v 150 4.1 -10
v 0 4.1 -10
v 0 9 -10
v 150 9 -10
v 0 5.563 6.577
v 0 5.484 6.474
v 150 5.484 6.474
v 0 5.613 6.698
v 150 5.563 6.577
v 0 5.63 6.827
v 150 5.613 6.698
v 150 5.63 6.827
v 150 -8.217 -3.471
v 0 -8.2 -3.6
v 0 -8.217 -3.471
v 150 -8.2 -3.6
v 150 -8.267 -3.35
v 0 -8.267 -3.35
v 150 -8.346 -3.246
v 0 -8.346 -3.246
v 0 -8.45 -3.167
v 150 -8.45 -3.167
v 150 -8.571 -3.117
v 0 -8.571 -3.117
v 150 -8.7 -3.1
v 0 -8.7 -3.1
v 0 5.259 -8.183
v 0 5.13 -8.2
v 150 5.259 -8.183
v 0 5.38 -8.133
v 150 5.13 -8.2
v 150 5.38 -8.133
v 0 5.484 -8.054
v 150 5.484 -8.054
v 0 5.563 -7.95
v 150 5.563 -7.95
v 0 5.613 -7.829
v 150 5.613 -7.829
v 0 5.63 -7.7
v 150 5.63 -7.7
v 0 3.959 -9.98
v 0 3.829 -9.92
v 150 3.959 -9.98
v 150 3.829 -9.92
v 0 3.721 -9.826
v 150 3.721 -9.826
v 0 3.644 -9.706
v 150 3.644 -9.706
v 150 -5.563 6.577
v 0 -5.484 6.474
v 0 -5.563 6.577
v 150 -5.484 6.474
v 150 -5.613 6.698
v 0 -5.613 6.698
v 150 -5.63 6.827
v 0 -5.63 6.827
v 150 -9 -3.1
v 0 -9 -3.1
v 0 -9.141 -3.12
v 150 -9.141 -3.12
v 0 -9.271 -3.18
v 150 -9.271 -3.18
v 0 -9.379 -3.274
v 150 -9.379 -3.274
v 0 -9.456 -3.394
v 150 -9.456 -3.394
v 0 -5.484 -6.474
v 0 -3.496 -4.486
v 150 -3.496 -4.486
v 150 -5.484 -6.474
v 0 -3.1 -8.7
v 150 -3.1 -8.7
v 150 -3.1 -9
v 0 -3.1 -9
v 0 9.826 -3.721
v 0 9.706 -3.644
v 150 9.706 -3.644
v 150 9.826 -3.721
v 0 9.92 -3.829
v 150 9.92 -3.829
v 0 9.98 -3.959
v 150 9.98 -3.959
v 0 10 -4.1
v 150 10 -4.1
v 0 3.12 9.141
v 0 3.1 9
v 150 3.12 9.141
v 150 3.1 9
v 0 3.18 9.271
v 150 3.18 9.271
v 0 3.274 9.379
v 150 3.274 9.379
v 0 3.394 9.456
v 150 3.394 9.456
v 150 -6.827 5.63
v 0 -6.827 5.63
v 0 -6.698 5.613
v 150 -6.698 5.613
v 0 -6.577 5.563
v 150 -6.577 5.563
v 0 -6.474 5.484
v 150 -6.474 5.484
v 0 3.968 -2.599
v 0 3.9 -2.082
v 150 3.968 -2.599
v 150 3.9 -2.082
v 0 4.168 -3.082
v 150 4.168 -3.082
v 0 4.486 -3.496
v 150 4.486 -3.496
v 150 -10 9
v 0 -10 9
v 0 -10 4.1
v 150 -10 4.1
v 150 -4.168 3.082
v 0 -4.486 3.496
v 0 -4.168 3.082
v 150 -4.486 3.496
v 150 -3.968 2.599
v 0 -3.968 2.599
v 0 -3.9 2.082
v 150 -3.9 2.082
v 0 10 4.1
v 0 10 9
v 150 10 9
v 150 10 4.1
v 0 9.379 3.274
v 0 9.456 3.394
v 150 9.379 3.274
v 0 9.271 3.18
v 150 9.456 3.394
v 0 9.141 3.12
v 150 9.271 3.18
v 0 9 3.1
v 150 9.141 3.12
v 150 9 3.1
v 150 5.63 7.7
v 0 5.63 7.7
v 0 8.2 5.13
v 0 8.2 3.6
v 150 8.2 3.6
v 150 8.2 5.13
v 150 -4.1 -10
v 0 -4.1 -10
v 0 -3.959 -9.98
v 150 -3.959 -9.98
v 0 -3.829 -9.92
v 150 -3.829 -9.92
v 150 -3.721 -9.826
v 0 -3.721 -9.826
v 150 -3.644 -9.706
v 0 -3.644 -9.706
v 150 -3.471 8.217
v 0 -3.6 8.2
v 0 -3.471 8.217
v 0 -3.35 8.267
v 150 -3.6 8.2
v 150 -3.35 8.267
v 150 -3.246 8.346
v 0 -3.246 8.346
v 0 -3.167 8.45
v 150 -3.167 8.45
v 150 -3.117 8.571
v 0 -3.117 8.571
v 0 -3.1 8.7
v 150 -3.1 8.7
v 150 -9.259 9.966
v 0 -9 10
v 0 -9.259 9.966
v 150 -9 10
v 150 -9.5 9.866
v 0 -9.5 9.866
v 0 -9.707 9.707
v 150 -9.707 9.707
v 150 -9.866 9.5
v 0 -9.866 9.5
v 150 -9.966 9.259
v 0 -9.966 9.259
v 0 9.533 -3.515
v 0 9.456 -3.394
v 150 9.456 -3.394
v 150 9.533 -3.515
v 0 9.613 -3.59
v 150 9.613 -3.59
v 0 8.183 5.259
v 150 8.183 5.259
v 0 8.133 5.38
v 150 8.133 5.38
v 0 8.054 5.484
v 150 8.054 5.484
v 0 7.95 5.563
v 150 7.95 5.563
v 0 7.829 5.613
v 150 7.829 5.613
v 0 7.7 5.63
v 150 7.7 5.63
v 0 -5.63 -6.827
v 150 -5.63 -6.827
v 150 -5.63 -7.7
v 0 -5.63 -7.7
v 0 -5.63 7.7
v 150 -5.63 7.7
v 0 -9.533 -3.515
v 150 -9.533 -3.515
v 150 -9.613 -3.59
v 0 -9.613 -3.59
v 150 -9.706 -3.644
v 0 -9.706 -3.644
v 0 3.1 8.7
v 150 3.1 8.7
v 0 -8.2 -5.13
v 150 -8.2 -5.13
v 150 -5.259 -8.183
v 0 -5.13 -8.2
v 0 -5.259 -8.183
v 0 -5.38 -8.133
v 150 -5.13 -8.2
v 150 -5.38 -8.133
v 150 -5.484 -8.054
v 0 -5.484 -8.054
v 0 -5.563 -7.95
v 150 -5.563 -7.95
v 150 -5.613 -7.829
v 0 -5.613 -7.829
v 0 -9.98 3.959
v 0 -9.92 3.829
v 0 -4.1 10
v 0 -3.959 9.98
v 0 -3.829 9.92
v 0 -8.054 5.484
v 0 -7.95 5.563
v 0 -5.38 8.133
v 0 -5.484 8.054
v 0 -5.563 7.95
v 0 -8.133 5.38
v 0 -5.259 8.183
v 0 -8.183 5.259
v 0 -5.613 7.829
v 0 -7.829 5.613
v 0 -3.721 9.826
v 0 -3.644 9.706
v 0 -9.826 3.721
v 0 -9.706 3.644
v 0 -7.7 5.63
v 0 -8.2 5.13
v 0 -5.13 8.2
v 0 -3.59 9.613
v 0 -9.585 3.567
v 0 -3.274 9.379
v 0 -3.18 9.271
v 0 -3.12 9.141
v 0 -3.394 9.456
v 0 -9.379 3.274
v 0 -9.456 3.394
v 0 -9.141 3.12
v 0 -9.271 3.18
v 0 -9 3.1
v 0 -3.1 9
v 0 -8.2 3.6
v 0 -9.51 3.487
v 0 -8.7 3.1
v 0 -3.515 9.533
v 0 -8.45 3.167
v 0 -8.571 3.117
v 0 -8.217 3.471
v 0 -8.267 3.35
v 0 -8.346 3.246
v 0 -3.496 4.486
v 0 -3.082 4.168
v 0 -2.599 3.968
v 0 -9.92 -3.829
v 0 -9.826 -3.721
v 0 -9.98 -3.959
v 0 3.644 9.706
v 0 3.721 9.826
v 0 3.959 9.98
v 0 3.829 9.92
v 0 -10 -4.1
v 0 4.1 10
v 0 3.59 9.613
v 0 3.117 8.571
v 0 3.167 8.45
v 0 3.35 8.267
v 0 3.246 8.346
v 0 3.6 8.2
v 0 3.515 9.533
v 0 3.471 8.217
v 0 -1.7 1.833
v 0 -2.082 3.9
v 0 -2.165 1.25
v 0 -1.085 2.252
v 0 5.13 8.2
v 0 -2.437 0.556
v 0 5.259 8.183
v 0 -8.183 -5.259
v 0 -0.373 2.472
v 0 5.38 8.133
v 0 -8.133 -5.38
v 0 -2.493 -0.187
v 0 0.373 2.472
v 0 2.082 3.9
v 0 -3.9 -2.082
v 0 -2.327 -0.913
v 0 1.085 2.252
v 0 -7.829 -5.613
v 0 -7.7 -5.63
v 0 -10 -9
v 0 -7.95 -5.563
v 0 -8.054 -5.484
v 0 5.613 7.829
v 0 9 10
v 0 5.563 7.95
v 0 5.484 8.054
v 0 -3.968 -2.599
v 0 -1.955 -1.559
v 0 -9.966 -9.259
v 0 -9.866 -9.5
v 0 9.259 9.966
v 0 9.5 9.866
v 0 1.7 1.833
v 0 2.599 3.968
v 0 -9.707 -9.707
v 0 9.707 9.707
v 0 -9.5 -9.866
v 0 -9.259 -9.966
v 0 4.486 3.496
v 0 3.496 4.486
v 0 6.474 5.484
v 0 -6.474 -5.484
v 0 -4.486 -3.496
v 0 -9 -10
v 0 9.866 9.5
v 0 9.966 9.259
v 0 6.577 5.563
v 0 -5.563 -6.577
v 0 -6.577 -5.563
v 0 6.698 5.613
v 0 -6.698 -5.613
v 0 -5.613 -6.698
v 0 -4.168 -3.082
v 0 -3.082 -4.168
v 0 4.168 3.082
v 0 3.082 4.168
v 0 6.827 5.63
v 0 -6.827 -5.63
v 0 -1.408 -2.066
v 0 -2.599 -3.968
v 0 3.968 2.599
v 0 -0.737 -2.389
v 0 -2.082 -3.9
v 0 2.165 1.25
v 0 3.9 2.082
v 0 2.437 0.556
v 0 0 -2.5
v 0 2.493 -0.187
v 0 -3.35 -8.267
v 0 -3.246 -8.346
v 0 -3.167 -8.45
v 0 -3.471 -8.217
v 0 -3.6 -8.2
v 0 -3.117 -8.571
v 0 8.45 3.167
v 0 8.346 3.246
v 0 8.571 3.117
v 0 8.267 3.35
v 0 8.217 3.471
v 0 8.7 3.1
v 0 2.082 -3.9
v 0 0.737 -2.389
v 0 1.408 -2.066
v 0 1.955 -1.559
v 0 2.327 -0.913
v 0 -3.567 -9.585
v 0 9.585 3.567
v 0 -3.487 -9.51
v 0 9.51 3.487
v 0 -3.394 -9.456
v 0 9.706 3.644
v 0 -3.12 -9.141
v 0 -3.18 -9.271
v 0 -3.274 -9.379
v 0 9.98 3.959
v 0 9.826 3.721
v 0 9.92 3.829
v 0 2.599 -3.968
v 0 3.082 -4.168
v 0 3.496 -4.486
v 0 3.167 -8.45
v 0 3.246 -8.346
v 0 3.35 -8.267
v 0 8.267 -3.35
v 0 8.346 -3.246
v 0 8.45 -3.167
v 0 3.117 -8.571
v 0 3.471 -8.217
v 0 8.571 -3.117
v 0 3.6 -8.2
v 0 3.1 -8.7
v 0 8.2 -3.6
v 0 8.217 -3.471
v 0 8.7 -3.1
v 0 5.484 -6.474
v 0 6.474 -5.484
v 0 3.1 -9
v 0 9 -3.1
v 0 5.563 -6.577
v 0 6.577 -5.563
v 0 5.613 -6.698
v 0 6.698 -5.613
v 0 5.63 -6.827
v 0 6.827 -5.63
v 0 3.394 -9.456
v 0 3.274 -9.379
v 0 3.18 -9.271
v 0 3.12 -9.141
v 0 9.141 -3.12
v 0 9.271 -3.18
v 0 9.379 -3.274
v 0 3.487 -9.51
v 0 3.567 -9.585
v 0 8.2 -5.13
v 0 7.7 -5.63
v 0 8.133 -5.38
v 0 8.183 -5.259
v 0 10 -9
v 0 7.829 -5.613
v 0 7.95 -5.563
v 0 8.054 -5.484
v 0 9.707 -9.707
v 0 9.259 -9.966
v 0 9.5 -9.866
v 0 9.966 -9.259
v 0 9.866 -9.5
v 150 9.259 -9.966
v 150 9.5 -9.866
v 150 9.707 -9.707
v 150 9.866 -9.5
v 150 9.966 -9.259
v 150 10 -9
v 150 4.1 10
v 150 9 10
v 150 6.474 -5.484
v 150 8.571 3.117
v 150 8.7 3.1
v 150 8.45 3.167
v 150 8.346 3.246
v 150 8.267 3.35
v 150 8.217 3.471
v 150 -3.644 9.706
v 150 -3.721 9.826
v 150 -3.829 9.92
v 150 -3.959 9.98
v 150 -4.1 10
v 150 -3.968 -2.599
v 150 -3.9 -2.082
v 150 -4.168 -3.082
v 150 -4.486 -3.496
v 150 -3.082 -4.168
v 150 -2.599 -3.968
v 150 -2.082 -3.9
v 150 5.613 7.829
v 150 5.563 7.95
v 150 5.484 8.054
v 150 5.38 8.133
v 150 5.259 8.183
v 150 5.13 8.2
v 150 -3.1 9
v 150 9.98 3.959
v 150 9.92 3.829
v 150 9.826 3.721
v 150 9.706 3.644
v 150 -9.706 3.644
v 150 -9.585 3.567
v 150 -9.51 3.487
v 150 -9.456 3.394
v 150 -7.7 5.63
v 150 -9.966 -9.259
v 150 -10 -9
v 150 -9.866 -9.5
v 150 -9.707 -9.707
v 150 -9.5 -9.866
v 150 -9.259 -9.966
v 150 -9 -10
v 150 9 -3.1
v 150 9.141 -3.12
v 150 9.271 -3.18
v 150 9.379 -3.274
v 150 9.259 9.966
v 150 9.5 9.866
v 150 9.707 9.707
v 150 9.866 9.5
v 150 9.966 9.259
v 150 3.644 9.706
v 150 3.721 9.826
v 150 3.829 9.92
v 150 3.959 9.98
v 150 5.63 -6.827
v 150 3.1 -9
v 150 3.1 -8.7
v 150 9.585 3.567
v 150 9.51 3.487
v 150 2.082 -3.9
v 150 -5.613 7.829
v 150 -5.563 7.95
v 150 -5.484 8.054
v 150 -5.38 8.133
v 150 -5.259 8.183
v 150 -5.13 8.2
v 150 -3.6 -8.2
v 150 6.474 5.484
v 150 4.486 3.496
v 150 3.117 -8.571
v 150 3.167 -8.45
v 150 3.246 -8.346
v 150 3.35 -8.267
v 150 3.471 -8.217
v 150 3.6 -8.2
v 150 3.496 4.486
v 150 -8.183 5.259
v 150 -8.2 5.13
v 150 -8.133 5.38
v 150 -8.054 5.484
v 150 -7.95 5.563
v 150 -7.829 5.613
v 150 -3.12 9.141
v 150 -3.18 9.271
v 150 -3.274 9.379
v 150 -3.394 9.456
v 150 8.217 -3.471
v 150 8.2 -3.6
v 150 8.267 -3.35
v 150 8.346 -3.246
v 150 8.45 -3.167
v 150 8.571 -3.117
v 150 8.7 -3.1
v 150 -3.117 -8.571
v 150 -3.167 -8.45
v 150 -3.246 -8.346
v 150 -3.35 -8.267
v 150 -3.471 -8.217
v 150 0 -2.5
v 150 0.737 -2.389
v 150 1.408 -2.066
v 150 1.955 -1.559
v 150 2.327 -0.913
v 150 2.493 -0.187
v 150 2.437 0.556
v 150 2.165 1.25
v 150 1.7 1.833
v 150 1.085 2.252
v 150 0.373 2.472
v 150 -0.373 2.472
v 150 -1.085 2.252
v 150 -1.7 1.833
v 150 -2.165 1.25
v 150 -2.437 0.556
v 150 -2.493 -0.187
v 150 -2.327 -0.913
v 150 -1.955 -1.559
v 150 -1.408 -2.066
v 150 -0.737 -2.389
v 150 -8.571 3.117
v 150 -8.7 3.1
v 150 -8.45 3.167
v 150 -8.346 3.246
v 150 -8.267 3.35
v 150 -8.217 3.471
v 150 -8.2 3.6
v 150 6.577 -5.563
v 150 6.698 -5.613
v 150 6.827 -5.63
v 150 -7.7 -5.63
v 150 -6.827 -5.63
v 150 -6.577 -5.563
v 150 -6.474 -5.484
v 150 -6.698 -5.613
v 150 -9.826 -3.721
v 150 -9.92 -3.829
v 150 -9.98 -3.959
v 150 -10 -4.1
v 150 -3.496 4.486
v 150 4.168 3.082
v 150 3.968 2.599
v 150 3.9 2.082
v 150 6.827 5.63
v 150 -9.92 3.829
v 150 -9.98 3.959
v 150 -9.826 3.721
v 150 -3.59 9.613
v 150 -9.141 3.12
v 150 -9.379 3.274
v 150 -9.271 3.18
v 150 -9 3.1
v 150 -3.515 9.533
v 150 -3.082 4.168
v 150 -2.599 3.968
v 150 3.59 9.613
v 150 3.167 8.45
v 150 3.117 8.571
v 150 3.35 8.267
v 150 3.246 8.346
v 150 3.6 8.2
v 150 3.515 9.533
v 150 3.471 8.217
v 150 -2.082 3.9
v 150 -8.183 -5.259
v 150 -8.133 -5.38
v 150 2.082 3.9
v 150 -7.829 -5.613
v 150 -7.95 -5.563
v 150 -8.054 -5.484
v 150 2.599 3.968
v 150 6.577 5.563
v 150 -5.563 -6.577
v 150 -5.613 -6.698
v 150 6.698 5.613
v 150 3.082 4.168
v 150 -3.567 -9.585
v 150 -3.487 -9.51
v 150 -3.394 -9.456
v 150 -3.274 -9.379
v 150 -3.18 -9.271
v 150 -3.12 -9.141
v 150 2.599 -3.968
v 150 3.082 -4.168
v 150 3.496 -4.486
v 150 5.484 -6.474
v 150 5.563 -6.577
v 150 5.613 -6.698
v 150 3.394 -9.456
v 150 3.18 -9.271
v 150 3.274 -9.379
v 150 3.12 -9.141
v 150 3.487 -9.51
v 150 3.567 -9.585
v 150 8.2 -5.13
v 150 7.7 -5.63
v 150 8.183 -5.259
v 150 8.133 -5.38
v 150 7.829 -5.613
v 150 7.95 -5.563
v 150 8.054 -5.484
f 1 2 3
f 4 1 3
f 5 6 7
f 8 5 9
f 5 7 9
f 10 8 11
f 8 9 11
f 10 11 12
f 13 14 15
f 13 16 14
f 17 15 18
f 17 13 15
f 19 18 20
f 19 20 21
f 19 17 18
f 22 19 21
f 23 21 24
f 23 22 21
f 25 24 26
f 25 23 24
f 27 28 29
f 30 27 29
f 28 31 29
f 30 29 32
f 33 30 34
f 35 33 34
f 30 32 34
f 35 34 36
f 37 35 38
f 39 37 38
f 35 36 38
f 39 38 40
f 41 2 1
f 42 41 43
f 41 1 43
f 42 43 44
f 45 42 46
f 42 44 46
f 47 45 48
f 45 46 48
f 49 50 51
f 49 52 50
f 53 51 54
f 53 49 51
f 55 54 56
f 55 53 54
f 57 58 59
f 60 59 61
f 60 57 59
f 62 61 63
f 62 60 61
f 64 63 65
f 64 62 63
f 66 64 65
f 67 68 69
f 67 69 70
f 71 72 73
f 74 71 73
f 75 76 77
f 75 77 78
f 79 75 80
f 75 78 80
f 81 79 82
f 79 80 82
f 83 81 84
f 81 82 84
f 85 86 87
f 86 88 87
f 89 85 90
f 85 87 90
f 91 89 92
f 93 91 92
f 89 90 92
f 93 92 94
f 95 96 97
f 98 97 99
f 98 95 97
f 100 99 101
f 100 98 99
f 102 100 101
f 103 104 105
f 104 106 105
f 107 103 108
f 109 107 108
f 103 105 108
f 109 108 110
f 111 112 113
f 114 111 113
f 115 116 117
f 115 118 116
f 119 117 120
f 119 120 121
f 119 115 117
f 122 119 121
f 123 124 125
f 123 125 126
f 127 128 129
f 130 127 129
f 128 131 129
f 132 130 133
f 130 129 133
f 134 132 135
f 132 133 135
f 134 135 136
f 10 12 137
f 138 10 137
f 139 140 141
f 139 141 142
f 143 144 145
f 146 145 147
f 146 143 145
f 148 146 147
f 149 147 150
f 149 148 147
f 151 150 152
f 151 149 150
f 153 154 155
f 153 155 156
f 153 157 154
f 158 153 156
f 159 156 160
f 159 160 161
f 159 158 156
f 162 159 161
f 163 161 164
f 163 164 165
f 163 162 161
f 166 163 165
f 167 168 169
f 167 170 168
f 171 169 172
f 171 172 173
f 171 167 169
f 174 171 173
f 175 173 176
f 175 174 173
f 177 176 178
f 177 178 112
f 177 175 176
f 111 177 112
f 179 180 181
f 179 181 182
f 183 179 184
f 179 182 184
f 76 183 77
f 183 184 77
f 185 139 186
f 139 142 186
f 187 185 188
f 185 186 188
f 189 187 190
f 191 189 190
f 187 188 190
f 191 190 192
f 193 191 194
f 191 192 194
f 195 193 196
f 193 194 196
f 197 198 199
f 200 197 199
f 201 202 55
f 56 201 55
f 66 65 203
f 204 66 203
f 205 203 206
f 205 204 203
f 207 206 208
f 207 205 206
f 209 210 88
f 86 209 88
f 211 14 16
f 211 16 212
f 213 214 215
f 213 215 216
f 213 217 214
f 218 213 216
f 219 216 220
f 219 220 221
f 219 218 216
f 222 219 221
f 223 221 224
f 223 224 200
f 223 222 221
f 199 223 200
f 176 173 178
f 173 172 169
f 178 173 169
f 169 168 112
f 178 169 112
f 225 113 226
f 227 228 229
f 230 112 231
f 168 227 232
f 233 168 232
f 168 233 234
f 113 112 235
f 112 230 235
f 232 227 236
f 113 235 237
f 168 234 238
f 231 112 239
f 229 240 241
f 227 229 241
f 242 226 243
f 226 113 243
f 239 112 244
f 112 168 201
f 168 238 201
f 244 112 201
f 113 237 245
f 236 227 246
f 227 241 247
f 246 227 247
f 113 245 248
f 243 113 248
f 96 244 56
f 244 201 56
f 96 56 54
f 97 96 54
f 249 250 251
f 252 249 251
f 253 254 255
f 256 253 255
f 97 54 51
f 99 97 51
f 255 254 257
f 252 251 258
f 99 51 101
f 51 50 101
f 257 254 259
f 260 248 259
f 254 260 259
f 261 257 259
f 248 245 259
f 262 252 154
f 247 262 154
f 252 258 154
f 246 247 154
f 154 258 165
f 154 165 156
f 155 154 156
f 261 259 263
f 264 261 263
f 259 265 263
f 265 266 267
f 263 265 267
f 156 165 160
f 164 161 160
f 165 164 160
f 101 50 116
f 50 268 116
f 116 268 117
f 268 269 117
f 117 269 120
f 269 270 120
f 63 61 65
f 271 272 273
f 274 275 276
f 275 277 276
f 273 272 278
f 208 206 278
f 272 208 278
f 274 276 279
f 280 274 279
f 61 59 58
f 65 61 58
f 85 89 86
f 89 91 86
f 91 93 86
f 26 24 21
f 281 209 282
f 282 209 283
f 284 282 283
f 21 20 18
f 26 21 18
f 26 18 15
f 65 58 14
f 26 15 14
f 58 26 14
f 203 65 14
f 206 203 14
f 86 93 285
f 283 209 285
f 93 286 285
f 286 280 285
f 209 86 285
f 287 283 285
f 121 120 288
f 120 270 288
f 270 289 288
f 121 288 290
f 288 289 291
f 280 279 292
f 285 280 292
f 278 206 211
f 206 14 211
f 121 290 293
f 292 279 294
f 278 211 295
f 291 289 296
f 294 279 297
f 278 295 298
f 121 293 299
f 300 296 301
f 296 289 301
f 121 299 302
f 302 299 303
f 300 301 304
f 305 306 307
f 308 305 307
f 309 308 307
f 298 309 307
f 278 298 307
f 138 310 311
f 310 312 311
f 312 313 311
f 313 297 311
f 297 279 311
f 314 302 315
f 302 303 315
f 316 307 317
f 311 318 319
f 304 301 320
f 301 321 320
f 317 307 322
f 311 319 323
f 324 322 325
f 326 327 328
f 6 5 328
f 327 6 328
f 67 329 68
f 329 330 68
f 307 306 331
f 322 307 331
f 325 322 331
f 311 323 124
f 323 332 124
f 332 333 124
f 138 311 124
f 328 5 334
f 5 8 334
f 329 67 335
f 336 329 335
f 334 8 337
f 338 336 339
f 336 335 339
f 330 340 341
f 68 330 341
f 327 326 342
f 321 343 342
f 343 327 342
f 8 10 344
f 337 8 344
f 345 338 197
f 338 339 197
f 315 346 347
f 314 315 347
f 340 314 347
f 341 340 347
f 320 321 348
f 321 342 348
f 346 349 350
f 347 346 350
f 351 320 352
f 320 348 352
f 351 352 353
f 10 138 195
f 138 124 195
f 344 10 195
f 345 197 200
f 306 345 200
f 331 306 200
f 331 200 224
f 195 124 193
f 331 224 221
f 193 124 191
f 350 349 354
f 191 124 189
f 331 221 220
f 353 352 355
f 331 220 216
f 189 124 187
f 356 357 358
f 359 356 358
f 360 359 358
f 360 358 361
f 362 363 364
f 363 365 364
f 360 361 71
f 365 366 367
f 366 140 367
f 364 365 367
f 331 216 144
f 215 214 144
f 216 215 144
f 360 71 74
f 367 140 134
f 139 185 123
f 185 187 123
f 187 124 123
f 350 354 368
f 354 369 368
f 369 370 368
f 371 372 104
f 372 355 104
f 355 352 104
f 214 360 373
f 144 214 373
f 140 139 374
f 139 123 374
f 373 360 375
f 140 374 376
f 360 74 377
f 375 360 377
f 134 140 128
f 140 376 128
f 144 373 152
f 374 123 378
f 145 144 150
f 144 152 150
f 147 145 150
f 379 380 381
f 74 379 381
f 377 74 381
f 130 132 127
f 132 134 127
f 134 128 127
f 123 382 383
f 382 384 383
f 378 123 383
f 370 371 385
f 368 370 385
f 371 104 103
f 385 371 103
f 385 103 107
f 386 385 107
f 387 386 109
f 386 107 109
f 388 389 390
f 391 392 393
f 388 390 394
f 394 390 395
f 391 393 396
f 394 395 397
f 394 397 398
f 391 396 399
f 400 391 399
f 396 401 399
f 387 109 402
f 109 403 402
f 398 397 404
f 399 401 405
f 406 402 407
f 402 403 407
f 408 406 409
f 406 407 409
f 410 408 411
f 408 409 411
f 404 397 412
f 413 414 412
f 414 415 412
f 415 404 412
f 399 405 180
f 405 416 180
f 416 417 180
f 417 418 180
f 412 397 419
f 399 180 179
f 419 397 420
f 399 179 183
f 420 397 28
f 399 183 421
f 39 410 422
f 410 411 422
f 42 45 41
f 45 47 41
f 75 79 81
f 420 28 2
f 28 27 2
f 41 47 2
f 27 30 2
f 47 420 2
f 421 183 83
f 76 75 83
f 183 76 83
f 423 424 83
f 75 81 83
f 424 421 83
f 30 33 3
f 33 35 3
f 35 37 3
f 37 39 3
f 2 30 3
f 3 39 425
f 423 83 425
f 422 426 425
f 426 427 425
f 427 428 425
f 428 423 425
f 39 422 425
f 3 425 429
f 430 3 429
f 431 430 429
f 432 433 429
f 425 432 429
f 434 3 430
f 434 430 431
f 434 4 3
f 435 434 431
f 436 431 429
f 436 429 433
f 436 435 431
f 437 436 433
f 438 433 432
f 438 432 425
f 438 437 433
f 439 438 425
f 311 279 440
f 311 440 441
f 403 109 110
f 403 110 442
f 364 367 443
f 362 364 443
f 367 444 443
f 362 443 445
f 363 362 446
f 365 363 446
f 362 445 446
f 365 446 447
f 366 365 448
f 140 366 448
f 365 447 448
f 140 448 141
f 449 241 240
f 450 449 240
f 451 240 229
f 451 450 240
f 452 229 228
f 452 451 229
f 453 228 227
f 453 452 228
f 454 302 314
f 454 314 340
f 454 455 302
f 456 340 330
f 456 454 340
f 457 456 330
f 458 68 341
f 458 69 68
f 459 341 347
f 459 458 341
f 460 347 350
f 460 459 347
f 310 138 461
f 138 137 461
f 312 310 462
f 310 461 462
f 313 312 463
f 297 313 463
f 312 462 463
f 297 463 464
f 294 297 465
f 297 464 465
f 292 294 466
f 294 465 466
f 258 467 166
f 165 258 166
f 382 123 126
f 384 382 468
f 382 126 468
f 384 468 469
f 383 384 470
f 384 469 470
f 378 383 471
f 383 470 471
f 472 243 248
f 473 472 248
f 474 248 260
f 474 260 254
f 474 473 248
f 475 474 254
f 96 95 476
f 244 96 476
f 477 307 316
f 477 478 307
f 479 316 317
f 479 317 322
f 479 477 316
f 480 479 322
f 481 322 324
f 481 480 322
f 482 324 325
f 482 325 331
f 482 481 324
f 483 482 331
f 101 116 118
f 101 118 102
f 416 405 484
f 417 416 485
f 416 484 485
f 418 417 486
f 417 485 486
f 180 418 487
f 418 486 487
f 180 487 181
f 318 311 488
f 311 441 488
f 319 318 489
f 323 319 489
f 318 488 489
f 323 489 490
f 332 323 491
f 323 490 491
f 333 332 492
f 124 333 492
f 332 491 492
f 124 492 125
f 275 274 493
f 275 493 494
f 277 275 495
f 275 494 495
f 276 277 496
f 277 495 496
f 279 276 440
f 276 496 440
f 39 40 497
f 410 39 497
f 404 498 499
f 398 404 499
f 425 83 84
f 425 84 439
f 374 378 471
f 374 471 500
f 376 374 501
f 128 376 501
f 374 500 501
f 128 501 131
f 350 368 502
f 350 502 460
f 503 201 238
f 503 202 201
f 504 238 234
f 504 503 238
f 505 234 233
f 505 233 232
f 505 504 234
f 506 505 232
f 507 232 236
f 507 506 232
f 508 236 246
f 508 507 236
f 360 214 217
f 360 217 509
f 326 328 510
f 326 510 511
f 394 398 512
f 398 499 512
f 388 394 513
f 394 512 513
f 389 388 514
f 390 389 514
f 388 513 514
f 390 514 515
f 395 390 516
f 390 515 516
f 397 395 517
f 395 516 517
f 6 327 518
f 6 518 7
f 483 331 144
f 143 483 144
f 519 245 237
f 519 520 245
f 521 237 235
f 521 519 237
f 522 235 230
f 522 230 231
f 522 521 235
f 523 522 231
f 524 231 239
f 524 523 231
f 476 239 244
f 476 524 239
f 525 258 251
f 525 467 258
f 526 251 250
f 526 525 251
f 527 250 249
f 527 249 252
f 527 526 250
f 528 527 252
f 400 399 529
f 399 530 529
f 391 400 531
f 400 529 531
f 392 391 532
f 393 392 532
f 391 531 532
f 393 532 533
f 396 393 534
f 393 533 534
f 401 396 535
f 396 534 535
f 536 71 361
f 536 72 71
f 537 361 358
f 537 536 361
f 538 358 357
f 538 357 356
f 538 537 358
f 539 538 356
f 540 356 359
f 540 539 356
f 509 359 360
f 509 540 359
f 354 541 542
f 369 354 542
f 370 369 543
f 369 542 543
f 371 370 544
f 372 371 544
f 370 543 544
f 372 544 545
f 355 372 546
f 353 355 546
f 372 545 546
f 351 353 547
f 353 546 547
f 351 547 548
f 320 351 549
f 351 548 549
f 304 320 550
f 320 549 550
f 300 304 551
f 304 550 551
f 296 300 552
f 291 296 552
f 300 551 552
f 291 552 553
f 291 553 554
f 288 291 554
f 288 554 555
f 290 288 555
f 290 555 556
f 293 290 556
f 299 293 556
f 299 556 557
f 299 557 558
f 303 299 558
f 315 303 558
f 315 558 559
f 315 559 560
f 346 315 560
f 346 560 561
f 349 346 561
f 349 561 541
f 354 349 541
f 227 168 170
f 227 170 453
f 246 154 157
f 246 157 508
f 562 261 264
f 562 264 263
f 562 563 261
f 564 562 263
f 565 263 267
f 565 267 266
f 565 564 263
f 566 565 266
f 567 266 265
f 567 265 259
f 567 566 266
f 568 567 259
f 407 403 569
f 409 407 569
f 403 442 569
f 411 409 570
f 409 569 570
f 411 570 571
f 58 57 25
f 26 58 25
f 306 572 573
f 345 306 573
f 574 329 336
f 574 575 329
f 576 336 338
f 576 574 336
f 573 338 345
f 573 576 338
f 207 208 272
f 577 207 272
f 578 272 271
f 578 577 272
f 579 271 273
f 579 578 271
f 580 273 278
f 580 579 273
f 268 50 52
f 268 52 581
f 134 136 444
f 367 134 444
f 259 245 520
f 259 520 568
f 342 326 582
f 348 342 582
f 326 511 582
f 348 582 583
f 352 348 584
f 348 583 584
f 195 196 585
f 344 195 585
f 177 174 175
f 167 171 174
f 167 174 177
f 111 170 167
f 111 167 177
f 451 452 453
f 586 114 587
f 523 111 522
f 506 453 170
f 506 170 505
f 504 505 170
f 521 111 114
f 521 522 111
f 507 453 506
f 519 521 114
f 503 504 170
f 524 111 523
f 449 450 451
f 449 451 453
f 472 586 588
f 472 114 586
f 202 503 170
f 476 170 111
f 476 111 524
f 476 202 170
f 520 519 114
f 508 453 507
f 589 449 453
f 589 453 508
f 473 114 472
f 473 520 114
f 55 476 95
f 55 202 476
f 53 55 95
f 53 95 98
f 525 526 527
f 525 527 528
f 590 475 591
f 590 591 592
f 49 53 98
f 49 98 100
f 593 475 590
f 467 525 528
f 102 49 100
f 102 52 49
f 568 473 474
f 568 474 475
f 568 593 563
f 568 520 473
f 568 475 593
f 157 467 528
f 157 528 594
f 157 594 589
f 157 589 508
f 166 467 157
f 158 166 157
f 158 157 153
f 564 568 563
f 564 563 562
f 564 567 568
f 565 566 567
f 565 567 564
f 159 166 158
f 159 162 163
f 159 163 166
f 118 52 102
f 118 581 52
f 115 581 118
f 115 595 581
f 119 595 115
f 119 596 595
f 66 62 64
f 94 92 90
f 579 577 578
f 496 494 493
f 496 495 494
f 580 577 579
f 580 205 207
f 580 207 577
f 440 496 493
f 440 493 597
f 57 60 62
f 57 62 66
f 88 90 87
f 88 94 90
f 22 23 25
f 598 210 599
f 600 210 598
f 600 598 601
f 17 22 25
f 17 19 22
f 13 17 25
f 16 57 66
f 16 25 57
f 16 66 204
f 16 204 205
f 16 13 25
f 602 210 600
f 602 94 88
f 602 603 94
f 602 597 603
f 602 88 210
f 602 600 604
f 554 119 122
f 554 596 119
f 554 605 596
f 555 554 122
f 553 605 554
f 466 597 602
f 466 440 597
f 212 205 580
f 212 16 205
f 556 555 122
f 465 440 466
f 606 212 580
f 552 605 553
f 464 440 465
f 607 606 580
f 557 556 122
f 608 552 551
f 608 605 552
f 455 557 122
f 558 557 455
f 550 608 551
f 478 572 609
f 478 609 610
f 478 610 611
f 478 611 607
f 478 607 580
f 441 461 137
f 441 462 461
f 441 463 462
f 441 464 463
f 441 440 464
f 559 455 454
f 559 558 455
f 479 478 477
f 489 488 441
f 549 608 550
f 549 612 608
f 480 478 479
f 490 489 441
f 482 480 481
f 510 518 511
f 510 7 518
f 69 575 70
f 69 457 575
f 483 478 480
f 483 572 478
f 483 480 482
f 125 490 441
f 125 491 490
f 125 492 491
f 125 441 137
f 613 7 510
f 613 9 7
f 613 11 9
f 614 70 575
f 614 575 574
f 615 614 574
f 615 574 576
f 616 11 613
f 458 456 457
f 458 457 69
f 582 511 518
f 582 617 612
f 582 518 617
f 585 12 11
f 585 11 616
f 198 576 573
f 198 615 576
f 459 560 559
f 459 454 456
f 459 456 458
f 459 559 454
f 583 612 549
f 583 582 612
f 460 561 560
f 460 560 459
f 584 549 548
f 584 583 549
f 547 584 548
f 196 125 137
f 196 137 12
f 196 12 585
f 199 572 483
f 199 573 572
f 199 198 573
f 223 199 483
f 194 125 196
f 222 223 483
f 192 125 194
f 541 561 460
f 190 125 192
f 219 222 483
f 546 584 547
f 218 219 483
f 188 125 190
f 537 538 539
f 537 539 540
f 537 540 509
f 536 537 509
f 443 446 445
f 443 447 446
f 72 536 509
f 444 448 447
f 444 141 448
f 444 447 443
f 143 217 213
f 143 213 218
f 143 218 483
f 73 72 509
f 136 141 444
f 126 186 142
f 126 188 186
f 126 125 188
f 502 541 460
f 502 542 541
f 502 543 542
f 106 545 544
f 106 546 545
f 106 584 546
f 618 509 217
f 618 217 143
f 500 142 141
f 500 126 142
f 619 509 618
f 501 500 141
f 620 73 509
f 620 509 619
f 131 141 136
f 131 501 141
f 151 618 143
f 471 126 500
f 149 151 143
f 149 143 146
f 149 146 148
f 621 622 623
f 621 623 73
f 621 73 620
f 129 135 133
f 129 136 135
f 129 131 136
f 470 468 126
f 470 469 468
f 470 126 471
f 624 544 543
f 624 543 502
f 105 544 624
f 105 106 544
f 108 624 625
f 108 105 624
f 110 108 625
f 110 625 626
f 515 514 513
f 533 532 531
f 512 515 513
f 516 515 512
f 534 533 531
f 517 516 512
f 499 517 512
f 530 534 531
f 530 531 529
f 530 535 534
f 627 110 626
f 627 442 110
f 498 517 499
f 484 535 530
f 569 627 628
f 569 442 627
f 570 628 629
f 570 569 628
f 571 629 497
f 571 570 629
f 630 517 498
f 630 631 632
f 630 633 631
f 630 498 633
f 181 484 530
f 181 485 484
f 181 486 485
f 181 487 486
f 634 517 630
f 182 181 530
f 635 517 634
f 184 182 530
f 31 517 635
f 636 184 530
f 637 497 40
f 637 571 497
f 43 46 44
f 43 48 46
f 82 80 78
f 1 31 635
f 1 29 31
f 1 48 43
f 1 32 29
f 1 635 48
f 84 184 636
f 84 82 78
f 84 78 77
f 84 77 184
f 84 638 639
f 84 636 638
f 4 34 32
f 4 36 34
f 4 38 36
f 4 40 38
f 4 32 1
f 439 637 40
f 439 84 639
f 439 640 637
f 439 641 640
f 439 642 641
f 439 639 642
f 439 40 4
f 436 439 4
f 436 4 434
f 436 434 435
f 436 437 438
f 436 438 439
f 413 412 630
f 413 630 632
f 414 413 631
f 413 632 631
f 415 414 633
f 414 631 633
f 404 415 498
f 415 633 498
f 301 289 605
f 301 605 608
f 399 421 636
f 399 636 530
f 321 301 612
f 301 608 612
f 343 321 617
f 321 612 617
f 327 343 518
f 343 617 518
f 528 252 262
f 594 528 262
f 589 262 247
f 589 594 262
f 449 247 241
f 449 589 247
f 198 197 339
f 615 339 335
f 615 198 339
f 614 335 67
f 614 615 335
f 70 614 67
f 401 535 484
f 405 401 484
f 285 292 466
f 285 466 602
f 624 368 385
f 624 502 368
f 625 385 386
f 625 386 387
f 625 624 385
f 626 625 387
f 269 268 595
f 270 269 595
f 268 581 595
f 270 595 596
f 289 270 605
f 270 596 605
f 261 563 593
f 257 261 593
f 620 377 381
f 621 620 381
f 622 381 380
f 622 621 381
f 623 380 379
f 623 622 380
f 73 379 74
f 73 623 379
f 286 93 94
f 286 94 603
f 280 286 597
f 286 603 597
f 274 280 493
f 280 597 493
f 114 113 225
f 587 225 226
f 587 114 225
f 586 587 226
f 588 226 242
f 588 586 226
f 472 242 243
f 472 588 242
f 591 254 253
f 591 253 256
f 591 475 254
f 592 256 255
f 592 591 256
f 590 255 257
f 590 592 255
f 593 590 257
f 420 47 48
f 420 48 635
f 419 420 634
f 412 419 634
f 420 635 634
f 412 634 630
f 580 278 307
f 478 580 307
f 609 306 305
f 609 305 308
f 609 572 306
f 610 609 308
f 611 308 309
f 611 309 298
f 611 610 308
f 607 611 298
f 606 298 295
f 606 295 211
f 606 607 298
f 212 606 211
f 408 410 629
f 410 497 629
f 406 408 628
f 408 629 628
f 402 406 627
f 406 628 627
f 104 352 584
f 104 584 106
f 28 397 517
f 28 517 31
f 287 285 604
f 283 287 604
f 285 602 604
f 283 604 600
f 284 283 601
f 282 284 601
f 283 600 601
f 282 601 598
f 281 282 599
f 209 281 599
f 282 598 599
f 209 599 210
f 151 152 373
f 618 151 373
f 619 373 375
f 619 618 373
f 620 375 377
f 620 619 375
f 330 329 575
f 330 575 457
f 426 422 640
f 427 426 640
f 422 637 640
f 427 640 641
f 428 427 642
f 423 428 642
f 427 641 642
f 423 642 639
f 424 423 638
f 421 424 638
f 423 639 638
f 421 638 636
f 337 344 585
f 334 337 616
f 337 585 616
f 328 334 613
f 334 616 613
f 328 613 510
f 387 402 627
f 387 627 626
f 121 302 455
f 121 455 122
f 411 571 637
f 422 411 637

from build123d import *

# Parameters (mm, degrees)
SKETCH1_W                = 20
SKETCH1_H                = 20
BOSS_EXTRUDE1_DEPTH      = 150
FILLET1_R                = 1
CUT_EXTRUDE1_DEPTH       = 151.665191733
F_5_0_5_DIAMETER_HOLE1_D = 5
FILLET2_R                = 2
FILLET3_R                = 0.5
FILLET4_R                = 0.5
FILLET5_R                = 0.5


with BuildPart() as part:
    # Sketch1 → Boss-Extrude1 (new body)
    with BuildSketch(Plane(origin=(0, 0, 0), x_dir=(0, 0, -1), z_dir=(1, 0, 0))):
        Rectangle(SKETCH1_W, SKETCH1_H)
    extrude(amount=BOSS_EXTRUDE1_DEPTH)

    # Fillet1
    fillet1_edges = [part.edges().sort_by_distance(p)[0] for p in [
        (75, 10, 10),
        (75, 10, -10),
        (75, -10, -10),
        (75, -10, 10),
    ]]
    fillet(fillet1_edges, radius=FILLET1_R)

    # Sketch3 → Cut-Extrude1 (cut, through all)
    with BuildSketch(Plane.ZY):
        Polygon((-3.6, 10), (3.6, 10), (3.6, 9.5), (3.1, 9.5), (3.1, 8.2), (5.63, 8.2), (5.63, 6.619949494), (2.910050506, 3.9), (-2.910050506, 3.9), (-5.63, 6.619949494), (-5.63, 8.2), (-3.1, 8.2), (-3.1, 9.5), (-3.6, 9.5), align=None)
        Polygon((10, 3.6), (10, -3.6), (9.5, -3.6), (9.5, -3.1), (8.2, -3.1), (8.2, -5.63), (6.619949494, -5.63), (3.9, -2.910050506), (3.9, 2.910050506), (6.619949494, 5.63), (8.2, 5.63), (8.2, 3.1), (9.5, 3.1), (9.5, 3.6), align=None)
        Polygon((3.6, -10), (-3.6, -10), (-3.6, -9.5), (-3.1, -9.5), (-3.1, -8.2), (-5.63, -8.2), (-5.63, -6.619949494), (-2.910050506, -3.9), (2.910050506, -3.9), (5.63, -6.619949494), (5.63, -8.2), (3.1, -8.2), (3.1, -9.5), (3.6, -9.5), align=None)
        Polygon((-10, -3.6), (-10, 3.6), (-9.5, 3.6), (-9.5, 3.1), (-8.2, 3.1), (-8.2, 5.63), (-6.619949494, 5.63), (-3.9, 2.910050506), (-3.9, -2.910050506), (-6.619949494, -5.63), (-8.2, -5.63), (-8.2, -3.1), (-9.5, -3.1), (-9.5, -3.6), align=None)
    extrude(amount=-CUT_EXTRUDE1_DEPTH, mode=Mode.SUBTRACT)

    # Ø5.0 (5) Diameter Hole1 (through all)
    with Locations(Plane.ZY):
        with Locations((0, 0)):
            Hole(F_5_0_5_DIAMETER_HOLE1_D / 2)

    # Fillet2
    fillet2_edges = [part.edges().sort_by_distance(p)[0] for p in [
        (75, -3.9, -2.910050506),
        (75, -3.9, 2.910050506),
        (75, 2.910050506, -3.9),
        (75, -2.910050506, -3.9),
        (75, -2.910050506, 3.9),
        (75, 2.910050506, 3.9),
        (75, 3.9, 2.910050506),
        (75, 3.9, -2.910050506),
    ]]
    fillet(fillet2_edges, radius=FILLET2_R)

    # Fillet3
    fillet3_edges = [part.edges().sort_by_distance(p)[0] for p in [
        (75, 3.6, -10),
        (75, 3.1, -9.5),
        (75, 3.1, -8.2),
        (75, 5.63, -8.2),
        (75, 5.63, -6.619949494),
        (75, 3.6, 10),
        (75, 3.1, 9.5),
        (75, 3.1, 8.2),
        (75, 5.63, 8.2),
        (75, 5.63, 6.619949494),
        (75, 6.619949494, 5.63),
        (75, 8.2, 5.63),
        (75, 8.2, 3.1),
        (75, 9.5, 3.1),
        (75, 10, 3.6),
        (75, 9.5, -3.1),
        (75, 10, -3.6),
        (75, 8.2, -3.1),
        (75, 8.2, -5.63),
        (75, 6.619949494, -5.63),
    ]]
    fillet(fillet3_edges, radius=FILLET3_R - 0.0001)  # a hair under: the kernel refuses the full size

    # Fillet4
    fillet4_edges = [part.edges().sort_by_distance(p)[0] for p in [
        (75, -3.6, 10),
        (75, -3.1, 9.5),
        (75, -3.1, 8.2),
        (75, -5.63, 8.2),
        (75, -5.63, 6.619949494),
        (75, -6.619949494, 5.63),
        (75, -8.2, 5.63),
        (75, -8.2, 3.1),
        (75, -10, 3.6),
        (75, -9.5, 3.1),
        (75, -10, -3.6),
        (75, -9.5, -3.1),
        (75, -8.2, -3.1),
        (75, -8.2, -5.63),
        (75, -6.619949494, -5.63),
        (75, -5.63, -6.619949494),
        (75, -5.63, -8.2),
        (75, -3.1, -8.2),
        (75, -3.1, -9.5),
        (75, -3.6, -10),
    ]]
    fillet(fillet4_edges, radius=FILLET4_R - 0.0001)  # a hair under: the kernel refuses the full size

    # Fillet5
    fillet5_edges = [part.edges().sort_by_distance(p)[0] for p in [
        (75, 3.6, 9.5),
        (75, 9.5, 3.6),
        (75, 9.5, -3.6),
        (75, 3.6, -9.5),
        (75, -3.6, 9.5),
        (75, -9.5, 3.6),
        (75, -9.5, -3.6),
        (75, -3.6, -9.5),
    ]]
    fillet(fillet5_edges, radius=FILLET5_R)


solid = part.part
